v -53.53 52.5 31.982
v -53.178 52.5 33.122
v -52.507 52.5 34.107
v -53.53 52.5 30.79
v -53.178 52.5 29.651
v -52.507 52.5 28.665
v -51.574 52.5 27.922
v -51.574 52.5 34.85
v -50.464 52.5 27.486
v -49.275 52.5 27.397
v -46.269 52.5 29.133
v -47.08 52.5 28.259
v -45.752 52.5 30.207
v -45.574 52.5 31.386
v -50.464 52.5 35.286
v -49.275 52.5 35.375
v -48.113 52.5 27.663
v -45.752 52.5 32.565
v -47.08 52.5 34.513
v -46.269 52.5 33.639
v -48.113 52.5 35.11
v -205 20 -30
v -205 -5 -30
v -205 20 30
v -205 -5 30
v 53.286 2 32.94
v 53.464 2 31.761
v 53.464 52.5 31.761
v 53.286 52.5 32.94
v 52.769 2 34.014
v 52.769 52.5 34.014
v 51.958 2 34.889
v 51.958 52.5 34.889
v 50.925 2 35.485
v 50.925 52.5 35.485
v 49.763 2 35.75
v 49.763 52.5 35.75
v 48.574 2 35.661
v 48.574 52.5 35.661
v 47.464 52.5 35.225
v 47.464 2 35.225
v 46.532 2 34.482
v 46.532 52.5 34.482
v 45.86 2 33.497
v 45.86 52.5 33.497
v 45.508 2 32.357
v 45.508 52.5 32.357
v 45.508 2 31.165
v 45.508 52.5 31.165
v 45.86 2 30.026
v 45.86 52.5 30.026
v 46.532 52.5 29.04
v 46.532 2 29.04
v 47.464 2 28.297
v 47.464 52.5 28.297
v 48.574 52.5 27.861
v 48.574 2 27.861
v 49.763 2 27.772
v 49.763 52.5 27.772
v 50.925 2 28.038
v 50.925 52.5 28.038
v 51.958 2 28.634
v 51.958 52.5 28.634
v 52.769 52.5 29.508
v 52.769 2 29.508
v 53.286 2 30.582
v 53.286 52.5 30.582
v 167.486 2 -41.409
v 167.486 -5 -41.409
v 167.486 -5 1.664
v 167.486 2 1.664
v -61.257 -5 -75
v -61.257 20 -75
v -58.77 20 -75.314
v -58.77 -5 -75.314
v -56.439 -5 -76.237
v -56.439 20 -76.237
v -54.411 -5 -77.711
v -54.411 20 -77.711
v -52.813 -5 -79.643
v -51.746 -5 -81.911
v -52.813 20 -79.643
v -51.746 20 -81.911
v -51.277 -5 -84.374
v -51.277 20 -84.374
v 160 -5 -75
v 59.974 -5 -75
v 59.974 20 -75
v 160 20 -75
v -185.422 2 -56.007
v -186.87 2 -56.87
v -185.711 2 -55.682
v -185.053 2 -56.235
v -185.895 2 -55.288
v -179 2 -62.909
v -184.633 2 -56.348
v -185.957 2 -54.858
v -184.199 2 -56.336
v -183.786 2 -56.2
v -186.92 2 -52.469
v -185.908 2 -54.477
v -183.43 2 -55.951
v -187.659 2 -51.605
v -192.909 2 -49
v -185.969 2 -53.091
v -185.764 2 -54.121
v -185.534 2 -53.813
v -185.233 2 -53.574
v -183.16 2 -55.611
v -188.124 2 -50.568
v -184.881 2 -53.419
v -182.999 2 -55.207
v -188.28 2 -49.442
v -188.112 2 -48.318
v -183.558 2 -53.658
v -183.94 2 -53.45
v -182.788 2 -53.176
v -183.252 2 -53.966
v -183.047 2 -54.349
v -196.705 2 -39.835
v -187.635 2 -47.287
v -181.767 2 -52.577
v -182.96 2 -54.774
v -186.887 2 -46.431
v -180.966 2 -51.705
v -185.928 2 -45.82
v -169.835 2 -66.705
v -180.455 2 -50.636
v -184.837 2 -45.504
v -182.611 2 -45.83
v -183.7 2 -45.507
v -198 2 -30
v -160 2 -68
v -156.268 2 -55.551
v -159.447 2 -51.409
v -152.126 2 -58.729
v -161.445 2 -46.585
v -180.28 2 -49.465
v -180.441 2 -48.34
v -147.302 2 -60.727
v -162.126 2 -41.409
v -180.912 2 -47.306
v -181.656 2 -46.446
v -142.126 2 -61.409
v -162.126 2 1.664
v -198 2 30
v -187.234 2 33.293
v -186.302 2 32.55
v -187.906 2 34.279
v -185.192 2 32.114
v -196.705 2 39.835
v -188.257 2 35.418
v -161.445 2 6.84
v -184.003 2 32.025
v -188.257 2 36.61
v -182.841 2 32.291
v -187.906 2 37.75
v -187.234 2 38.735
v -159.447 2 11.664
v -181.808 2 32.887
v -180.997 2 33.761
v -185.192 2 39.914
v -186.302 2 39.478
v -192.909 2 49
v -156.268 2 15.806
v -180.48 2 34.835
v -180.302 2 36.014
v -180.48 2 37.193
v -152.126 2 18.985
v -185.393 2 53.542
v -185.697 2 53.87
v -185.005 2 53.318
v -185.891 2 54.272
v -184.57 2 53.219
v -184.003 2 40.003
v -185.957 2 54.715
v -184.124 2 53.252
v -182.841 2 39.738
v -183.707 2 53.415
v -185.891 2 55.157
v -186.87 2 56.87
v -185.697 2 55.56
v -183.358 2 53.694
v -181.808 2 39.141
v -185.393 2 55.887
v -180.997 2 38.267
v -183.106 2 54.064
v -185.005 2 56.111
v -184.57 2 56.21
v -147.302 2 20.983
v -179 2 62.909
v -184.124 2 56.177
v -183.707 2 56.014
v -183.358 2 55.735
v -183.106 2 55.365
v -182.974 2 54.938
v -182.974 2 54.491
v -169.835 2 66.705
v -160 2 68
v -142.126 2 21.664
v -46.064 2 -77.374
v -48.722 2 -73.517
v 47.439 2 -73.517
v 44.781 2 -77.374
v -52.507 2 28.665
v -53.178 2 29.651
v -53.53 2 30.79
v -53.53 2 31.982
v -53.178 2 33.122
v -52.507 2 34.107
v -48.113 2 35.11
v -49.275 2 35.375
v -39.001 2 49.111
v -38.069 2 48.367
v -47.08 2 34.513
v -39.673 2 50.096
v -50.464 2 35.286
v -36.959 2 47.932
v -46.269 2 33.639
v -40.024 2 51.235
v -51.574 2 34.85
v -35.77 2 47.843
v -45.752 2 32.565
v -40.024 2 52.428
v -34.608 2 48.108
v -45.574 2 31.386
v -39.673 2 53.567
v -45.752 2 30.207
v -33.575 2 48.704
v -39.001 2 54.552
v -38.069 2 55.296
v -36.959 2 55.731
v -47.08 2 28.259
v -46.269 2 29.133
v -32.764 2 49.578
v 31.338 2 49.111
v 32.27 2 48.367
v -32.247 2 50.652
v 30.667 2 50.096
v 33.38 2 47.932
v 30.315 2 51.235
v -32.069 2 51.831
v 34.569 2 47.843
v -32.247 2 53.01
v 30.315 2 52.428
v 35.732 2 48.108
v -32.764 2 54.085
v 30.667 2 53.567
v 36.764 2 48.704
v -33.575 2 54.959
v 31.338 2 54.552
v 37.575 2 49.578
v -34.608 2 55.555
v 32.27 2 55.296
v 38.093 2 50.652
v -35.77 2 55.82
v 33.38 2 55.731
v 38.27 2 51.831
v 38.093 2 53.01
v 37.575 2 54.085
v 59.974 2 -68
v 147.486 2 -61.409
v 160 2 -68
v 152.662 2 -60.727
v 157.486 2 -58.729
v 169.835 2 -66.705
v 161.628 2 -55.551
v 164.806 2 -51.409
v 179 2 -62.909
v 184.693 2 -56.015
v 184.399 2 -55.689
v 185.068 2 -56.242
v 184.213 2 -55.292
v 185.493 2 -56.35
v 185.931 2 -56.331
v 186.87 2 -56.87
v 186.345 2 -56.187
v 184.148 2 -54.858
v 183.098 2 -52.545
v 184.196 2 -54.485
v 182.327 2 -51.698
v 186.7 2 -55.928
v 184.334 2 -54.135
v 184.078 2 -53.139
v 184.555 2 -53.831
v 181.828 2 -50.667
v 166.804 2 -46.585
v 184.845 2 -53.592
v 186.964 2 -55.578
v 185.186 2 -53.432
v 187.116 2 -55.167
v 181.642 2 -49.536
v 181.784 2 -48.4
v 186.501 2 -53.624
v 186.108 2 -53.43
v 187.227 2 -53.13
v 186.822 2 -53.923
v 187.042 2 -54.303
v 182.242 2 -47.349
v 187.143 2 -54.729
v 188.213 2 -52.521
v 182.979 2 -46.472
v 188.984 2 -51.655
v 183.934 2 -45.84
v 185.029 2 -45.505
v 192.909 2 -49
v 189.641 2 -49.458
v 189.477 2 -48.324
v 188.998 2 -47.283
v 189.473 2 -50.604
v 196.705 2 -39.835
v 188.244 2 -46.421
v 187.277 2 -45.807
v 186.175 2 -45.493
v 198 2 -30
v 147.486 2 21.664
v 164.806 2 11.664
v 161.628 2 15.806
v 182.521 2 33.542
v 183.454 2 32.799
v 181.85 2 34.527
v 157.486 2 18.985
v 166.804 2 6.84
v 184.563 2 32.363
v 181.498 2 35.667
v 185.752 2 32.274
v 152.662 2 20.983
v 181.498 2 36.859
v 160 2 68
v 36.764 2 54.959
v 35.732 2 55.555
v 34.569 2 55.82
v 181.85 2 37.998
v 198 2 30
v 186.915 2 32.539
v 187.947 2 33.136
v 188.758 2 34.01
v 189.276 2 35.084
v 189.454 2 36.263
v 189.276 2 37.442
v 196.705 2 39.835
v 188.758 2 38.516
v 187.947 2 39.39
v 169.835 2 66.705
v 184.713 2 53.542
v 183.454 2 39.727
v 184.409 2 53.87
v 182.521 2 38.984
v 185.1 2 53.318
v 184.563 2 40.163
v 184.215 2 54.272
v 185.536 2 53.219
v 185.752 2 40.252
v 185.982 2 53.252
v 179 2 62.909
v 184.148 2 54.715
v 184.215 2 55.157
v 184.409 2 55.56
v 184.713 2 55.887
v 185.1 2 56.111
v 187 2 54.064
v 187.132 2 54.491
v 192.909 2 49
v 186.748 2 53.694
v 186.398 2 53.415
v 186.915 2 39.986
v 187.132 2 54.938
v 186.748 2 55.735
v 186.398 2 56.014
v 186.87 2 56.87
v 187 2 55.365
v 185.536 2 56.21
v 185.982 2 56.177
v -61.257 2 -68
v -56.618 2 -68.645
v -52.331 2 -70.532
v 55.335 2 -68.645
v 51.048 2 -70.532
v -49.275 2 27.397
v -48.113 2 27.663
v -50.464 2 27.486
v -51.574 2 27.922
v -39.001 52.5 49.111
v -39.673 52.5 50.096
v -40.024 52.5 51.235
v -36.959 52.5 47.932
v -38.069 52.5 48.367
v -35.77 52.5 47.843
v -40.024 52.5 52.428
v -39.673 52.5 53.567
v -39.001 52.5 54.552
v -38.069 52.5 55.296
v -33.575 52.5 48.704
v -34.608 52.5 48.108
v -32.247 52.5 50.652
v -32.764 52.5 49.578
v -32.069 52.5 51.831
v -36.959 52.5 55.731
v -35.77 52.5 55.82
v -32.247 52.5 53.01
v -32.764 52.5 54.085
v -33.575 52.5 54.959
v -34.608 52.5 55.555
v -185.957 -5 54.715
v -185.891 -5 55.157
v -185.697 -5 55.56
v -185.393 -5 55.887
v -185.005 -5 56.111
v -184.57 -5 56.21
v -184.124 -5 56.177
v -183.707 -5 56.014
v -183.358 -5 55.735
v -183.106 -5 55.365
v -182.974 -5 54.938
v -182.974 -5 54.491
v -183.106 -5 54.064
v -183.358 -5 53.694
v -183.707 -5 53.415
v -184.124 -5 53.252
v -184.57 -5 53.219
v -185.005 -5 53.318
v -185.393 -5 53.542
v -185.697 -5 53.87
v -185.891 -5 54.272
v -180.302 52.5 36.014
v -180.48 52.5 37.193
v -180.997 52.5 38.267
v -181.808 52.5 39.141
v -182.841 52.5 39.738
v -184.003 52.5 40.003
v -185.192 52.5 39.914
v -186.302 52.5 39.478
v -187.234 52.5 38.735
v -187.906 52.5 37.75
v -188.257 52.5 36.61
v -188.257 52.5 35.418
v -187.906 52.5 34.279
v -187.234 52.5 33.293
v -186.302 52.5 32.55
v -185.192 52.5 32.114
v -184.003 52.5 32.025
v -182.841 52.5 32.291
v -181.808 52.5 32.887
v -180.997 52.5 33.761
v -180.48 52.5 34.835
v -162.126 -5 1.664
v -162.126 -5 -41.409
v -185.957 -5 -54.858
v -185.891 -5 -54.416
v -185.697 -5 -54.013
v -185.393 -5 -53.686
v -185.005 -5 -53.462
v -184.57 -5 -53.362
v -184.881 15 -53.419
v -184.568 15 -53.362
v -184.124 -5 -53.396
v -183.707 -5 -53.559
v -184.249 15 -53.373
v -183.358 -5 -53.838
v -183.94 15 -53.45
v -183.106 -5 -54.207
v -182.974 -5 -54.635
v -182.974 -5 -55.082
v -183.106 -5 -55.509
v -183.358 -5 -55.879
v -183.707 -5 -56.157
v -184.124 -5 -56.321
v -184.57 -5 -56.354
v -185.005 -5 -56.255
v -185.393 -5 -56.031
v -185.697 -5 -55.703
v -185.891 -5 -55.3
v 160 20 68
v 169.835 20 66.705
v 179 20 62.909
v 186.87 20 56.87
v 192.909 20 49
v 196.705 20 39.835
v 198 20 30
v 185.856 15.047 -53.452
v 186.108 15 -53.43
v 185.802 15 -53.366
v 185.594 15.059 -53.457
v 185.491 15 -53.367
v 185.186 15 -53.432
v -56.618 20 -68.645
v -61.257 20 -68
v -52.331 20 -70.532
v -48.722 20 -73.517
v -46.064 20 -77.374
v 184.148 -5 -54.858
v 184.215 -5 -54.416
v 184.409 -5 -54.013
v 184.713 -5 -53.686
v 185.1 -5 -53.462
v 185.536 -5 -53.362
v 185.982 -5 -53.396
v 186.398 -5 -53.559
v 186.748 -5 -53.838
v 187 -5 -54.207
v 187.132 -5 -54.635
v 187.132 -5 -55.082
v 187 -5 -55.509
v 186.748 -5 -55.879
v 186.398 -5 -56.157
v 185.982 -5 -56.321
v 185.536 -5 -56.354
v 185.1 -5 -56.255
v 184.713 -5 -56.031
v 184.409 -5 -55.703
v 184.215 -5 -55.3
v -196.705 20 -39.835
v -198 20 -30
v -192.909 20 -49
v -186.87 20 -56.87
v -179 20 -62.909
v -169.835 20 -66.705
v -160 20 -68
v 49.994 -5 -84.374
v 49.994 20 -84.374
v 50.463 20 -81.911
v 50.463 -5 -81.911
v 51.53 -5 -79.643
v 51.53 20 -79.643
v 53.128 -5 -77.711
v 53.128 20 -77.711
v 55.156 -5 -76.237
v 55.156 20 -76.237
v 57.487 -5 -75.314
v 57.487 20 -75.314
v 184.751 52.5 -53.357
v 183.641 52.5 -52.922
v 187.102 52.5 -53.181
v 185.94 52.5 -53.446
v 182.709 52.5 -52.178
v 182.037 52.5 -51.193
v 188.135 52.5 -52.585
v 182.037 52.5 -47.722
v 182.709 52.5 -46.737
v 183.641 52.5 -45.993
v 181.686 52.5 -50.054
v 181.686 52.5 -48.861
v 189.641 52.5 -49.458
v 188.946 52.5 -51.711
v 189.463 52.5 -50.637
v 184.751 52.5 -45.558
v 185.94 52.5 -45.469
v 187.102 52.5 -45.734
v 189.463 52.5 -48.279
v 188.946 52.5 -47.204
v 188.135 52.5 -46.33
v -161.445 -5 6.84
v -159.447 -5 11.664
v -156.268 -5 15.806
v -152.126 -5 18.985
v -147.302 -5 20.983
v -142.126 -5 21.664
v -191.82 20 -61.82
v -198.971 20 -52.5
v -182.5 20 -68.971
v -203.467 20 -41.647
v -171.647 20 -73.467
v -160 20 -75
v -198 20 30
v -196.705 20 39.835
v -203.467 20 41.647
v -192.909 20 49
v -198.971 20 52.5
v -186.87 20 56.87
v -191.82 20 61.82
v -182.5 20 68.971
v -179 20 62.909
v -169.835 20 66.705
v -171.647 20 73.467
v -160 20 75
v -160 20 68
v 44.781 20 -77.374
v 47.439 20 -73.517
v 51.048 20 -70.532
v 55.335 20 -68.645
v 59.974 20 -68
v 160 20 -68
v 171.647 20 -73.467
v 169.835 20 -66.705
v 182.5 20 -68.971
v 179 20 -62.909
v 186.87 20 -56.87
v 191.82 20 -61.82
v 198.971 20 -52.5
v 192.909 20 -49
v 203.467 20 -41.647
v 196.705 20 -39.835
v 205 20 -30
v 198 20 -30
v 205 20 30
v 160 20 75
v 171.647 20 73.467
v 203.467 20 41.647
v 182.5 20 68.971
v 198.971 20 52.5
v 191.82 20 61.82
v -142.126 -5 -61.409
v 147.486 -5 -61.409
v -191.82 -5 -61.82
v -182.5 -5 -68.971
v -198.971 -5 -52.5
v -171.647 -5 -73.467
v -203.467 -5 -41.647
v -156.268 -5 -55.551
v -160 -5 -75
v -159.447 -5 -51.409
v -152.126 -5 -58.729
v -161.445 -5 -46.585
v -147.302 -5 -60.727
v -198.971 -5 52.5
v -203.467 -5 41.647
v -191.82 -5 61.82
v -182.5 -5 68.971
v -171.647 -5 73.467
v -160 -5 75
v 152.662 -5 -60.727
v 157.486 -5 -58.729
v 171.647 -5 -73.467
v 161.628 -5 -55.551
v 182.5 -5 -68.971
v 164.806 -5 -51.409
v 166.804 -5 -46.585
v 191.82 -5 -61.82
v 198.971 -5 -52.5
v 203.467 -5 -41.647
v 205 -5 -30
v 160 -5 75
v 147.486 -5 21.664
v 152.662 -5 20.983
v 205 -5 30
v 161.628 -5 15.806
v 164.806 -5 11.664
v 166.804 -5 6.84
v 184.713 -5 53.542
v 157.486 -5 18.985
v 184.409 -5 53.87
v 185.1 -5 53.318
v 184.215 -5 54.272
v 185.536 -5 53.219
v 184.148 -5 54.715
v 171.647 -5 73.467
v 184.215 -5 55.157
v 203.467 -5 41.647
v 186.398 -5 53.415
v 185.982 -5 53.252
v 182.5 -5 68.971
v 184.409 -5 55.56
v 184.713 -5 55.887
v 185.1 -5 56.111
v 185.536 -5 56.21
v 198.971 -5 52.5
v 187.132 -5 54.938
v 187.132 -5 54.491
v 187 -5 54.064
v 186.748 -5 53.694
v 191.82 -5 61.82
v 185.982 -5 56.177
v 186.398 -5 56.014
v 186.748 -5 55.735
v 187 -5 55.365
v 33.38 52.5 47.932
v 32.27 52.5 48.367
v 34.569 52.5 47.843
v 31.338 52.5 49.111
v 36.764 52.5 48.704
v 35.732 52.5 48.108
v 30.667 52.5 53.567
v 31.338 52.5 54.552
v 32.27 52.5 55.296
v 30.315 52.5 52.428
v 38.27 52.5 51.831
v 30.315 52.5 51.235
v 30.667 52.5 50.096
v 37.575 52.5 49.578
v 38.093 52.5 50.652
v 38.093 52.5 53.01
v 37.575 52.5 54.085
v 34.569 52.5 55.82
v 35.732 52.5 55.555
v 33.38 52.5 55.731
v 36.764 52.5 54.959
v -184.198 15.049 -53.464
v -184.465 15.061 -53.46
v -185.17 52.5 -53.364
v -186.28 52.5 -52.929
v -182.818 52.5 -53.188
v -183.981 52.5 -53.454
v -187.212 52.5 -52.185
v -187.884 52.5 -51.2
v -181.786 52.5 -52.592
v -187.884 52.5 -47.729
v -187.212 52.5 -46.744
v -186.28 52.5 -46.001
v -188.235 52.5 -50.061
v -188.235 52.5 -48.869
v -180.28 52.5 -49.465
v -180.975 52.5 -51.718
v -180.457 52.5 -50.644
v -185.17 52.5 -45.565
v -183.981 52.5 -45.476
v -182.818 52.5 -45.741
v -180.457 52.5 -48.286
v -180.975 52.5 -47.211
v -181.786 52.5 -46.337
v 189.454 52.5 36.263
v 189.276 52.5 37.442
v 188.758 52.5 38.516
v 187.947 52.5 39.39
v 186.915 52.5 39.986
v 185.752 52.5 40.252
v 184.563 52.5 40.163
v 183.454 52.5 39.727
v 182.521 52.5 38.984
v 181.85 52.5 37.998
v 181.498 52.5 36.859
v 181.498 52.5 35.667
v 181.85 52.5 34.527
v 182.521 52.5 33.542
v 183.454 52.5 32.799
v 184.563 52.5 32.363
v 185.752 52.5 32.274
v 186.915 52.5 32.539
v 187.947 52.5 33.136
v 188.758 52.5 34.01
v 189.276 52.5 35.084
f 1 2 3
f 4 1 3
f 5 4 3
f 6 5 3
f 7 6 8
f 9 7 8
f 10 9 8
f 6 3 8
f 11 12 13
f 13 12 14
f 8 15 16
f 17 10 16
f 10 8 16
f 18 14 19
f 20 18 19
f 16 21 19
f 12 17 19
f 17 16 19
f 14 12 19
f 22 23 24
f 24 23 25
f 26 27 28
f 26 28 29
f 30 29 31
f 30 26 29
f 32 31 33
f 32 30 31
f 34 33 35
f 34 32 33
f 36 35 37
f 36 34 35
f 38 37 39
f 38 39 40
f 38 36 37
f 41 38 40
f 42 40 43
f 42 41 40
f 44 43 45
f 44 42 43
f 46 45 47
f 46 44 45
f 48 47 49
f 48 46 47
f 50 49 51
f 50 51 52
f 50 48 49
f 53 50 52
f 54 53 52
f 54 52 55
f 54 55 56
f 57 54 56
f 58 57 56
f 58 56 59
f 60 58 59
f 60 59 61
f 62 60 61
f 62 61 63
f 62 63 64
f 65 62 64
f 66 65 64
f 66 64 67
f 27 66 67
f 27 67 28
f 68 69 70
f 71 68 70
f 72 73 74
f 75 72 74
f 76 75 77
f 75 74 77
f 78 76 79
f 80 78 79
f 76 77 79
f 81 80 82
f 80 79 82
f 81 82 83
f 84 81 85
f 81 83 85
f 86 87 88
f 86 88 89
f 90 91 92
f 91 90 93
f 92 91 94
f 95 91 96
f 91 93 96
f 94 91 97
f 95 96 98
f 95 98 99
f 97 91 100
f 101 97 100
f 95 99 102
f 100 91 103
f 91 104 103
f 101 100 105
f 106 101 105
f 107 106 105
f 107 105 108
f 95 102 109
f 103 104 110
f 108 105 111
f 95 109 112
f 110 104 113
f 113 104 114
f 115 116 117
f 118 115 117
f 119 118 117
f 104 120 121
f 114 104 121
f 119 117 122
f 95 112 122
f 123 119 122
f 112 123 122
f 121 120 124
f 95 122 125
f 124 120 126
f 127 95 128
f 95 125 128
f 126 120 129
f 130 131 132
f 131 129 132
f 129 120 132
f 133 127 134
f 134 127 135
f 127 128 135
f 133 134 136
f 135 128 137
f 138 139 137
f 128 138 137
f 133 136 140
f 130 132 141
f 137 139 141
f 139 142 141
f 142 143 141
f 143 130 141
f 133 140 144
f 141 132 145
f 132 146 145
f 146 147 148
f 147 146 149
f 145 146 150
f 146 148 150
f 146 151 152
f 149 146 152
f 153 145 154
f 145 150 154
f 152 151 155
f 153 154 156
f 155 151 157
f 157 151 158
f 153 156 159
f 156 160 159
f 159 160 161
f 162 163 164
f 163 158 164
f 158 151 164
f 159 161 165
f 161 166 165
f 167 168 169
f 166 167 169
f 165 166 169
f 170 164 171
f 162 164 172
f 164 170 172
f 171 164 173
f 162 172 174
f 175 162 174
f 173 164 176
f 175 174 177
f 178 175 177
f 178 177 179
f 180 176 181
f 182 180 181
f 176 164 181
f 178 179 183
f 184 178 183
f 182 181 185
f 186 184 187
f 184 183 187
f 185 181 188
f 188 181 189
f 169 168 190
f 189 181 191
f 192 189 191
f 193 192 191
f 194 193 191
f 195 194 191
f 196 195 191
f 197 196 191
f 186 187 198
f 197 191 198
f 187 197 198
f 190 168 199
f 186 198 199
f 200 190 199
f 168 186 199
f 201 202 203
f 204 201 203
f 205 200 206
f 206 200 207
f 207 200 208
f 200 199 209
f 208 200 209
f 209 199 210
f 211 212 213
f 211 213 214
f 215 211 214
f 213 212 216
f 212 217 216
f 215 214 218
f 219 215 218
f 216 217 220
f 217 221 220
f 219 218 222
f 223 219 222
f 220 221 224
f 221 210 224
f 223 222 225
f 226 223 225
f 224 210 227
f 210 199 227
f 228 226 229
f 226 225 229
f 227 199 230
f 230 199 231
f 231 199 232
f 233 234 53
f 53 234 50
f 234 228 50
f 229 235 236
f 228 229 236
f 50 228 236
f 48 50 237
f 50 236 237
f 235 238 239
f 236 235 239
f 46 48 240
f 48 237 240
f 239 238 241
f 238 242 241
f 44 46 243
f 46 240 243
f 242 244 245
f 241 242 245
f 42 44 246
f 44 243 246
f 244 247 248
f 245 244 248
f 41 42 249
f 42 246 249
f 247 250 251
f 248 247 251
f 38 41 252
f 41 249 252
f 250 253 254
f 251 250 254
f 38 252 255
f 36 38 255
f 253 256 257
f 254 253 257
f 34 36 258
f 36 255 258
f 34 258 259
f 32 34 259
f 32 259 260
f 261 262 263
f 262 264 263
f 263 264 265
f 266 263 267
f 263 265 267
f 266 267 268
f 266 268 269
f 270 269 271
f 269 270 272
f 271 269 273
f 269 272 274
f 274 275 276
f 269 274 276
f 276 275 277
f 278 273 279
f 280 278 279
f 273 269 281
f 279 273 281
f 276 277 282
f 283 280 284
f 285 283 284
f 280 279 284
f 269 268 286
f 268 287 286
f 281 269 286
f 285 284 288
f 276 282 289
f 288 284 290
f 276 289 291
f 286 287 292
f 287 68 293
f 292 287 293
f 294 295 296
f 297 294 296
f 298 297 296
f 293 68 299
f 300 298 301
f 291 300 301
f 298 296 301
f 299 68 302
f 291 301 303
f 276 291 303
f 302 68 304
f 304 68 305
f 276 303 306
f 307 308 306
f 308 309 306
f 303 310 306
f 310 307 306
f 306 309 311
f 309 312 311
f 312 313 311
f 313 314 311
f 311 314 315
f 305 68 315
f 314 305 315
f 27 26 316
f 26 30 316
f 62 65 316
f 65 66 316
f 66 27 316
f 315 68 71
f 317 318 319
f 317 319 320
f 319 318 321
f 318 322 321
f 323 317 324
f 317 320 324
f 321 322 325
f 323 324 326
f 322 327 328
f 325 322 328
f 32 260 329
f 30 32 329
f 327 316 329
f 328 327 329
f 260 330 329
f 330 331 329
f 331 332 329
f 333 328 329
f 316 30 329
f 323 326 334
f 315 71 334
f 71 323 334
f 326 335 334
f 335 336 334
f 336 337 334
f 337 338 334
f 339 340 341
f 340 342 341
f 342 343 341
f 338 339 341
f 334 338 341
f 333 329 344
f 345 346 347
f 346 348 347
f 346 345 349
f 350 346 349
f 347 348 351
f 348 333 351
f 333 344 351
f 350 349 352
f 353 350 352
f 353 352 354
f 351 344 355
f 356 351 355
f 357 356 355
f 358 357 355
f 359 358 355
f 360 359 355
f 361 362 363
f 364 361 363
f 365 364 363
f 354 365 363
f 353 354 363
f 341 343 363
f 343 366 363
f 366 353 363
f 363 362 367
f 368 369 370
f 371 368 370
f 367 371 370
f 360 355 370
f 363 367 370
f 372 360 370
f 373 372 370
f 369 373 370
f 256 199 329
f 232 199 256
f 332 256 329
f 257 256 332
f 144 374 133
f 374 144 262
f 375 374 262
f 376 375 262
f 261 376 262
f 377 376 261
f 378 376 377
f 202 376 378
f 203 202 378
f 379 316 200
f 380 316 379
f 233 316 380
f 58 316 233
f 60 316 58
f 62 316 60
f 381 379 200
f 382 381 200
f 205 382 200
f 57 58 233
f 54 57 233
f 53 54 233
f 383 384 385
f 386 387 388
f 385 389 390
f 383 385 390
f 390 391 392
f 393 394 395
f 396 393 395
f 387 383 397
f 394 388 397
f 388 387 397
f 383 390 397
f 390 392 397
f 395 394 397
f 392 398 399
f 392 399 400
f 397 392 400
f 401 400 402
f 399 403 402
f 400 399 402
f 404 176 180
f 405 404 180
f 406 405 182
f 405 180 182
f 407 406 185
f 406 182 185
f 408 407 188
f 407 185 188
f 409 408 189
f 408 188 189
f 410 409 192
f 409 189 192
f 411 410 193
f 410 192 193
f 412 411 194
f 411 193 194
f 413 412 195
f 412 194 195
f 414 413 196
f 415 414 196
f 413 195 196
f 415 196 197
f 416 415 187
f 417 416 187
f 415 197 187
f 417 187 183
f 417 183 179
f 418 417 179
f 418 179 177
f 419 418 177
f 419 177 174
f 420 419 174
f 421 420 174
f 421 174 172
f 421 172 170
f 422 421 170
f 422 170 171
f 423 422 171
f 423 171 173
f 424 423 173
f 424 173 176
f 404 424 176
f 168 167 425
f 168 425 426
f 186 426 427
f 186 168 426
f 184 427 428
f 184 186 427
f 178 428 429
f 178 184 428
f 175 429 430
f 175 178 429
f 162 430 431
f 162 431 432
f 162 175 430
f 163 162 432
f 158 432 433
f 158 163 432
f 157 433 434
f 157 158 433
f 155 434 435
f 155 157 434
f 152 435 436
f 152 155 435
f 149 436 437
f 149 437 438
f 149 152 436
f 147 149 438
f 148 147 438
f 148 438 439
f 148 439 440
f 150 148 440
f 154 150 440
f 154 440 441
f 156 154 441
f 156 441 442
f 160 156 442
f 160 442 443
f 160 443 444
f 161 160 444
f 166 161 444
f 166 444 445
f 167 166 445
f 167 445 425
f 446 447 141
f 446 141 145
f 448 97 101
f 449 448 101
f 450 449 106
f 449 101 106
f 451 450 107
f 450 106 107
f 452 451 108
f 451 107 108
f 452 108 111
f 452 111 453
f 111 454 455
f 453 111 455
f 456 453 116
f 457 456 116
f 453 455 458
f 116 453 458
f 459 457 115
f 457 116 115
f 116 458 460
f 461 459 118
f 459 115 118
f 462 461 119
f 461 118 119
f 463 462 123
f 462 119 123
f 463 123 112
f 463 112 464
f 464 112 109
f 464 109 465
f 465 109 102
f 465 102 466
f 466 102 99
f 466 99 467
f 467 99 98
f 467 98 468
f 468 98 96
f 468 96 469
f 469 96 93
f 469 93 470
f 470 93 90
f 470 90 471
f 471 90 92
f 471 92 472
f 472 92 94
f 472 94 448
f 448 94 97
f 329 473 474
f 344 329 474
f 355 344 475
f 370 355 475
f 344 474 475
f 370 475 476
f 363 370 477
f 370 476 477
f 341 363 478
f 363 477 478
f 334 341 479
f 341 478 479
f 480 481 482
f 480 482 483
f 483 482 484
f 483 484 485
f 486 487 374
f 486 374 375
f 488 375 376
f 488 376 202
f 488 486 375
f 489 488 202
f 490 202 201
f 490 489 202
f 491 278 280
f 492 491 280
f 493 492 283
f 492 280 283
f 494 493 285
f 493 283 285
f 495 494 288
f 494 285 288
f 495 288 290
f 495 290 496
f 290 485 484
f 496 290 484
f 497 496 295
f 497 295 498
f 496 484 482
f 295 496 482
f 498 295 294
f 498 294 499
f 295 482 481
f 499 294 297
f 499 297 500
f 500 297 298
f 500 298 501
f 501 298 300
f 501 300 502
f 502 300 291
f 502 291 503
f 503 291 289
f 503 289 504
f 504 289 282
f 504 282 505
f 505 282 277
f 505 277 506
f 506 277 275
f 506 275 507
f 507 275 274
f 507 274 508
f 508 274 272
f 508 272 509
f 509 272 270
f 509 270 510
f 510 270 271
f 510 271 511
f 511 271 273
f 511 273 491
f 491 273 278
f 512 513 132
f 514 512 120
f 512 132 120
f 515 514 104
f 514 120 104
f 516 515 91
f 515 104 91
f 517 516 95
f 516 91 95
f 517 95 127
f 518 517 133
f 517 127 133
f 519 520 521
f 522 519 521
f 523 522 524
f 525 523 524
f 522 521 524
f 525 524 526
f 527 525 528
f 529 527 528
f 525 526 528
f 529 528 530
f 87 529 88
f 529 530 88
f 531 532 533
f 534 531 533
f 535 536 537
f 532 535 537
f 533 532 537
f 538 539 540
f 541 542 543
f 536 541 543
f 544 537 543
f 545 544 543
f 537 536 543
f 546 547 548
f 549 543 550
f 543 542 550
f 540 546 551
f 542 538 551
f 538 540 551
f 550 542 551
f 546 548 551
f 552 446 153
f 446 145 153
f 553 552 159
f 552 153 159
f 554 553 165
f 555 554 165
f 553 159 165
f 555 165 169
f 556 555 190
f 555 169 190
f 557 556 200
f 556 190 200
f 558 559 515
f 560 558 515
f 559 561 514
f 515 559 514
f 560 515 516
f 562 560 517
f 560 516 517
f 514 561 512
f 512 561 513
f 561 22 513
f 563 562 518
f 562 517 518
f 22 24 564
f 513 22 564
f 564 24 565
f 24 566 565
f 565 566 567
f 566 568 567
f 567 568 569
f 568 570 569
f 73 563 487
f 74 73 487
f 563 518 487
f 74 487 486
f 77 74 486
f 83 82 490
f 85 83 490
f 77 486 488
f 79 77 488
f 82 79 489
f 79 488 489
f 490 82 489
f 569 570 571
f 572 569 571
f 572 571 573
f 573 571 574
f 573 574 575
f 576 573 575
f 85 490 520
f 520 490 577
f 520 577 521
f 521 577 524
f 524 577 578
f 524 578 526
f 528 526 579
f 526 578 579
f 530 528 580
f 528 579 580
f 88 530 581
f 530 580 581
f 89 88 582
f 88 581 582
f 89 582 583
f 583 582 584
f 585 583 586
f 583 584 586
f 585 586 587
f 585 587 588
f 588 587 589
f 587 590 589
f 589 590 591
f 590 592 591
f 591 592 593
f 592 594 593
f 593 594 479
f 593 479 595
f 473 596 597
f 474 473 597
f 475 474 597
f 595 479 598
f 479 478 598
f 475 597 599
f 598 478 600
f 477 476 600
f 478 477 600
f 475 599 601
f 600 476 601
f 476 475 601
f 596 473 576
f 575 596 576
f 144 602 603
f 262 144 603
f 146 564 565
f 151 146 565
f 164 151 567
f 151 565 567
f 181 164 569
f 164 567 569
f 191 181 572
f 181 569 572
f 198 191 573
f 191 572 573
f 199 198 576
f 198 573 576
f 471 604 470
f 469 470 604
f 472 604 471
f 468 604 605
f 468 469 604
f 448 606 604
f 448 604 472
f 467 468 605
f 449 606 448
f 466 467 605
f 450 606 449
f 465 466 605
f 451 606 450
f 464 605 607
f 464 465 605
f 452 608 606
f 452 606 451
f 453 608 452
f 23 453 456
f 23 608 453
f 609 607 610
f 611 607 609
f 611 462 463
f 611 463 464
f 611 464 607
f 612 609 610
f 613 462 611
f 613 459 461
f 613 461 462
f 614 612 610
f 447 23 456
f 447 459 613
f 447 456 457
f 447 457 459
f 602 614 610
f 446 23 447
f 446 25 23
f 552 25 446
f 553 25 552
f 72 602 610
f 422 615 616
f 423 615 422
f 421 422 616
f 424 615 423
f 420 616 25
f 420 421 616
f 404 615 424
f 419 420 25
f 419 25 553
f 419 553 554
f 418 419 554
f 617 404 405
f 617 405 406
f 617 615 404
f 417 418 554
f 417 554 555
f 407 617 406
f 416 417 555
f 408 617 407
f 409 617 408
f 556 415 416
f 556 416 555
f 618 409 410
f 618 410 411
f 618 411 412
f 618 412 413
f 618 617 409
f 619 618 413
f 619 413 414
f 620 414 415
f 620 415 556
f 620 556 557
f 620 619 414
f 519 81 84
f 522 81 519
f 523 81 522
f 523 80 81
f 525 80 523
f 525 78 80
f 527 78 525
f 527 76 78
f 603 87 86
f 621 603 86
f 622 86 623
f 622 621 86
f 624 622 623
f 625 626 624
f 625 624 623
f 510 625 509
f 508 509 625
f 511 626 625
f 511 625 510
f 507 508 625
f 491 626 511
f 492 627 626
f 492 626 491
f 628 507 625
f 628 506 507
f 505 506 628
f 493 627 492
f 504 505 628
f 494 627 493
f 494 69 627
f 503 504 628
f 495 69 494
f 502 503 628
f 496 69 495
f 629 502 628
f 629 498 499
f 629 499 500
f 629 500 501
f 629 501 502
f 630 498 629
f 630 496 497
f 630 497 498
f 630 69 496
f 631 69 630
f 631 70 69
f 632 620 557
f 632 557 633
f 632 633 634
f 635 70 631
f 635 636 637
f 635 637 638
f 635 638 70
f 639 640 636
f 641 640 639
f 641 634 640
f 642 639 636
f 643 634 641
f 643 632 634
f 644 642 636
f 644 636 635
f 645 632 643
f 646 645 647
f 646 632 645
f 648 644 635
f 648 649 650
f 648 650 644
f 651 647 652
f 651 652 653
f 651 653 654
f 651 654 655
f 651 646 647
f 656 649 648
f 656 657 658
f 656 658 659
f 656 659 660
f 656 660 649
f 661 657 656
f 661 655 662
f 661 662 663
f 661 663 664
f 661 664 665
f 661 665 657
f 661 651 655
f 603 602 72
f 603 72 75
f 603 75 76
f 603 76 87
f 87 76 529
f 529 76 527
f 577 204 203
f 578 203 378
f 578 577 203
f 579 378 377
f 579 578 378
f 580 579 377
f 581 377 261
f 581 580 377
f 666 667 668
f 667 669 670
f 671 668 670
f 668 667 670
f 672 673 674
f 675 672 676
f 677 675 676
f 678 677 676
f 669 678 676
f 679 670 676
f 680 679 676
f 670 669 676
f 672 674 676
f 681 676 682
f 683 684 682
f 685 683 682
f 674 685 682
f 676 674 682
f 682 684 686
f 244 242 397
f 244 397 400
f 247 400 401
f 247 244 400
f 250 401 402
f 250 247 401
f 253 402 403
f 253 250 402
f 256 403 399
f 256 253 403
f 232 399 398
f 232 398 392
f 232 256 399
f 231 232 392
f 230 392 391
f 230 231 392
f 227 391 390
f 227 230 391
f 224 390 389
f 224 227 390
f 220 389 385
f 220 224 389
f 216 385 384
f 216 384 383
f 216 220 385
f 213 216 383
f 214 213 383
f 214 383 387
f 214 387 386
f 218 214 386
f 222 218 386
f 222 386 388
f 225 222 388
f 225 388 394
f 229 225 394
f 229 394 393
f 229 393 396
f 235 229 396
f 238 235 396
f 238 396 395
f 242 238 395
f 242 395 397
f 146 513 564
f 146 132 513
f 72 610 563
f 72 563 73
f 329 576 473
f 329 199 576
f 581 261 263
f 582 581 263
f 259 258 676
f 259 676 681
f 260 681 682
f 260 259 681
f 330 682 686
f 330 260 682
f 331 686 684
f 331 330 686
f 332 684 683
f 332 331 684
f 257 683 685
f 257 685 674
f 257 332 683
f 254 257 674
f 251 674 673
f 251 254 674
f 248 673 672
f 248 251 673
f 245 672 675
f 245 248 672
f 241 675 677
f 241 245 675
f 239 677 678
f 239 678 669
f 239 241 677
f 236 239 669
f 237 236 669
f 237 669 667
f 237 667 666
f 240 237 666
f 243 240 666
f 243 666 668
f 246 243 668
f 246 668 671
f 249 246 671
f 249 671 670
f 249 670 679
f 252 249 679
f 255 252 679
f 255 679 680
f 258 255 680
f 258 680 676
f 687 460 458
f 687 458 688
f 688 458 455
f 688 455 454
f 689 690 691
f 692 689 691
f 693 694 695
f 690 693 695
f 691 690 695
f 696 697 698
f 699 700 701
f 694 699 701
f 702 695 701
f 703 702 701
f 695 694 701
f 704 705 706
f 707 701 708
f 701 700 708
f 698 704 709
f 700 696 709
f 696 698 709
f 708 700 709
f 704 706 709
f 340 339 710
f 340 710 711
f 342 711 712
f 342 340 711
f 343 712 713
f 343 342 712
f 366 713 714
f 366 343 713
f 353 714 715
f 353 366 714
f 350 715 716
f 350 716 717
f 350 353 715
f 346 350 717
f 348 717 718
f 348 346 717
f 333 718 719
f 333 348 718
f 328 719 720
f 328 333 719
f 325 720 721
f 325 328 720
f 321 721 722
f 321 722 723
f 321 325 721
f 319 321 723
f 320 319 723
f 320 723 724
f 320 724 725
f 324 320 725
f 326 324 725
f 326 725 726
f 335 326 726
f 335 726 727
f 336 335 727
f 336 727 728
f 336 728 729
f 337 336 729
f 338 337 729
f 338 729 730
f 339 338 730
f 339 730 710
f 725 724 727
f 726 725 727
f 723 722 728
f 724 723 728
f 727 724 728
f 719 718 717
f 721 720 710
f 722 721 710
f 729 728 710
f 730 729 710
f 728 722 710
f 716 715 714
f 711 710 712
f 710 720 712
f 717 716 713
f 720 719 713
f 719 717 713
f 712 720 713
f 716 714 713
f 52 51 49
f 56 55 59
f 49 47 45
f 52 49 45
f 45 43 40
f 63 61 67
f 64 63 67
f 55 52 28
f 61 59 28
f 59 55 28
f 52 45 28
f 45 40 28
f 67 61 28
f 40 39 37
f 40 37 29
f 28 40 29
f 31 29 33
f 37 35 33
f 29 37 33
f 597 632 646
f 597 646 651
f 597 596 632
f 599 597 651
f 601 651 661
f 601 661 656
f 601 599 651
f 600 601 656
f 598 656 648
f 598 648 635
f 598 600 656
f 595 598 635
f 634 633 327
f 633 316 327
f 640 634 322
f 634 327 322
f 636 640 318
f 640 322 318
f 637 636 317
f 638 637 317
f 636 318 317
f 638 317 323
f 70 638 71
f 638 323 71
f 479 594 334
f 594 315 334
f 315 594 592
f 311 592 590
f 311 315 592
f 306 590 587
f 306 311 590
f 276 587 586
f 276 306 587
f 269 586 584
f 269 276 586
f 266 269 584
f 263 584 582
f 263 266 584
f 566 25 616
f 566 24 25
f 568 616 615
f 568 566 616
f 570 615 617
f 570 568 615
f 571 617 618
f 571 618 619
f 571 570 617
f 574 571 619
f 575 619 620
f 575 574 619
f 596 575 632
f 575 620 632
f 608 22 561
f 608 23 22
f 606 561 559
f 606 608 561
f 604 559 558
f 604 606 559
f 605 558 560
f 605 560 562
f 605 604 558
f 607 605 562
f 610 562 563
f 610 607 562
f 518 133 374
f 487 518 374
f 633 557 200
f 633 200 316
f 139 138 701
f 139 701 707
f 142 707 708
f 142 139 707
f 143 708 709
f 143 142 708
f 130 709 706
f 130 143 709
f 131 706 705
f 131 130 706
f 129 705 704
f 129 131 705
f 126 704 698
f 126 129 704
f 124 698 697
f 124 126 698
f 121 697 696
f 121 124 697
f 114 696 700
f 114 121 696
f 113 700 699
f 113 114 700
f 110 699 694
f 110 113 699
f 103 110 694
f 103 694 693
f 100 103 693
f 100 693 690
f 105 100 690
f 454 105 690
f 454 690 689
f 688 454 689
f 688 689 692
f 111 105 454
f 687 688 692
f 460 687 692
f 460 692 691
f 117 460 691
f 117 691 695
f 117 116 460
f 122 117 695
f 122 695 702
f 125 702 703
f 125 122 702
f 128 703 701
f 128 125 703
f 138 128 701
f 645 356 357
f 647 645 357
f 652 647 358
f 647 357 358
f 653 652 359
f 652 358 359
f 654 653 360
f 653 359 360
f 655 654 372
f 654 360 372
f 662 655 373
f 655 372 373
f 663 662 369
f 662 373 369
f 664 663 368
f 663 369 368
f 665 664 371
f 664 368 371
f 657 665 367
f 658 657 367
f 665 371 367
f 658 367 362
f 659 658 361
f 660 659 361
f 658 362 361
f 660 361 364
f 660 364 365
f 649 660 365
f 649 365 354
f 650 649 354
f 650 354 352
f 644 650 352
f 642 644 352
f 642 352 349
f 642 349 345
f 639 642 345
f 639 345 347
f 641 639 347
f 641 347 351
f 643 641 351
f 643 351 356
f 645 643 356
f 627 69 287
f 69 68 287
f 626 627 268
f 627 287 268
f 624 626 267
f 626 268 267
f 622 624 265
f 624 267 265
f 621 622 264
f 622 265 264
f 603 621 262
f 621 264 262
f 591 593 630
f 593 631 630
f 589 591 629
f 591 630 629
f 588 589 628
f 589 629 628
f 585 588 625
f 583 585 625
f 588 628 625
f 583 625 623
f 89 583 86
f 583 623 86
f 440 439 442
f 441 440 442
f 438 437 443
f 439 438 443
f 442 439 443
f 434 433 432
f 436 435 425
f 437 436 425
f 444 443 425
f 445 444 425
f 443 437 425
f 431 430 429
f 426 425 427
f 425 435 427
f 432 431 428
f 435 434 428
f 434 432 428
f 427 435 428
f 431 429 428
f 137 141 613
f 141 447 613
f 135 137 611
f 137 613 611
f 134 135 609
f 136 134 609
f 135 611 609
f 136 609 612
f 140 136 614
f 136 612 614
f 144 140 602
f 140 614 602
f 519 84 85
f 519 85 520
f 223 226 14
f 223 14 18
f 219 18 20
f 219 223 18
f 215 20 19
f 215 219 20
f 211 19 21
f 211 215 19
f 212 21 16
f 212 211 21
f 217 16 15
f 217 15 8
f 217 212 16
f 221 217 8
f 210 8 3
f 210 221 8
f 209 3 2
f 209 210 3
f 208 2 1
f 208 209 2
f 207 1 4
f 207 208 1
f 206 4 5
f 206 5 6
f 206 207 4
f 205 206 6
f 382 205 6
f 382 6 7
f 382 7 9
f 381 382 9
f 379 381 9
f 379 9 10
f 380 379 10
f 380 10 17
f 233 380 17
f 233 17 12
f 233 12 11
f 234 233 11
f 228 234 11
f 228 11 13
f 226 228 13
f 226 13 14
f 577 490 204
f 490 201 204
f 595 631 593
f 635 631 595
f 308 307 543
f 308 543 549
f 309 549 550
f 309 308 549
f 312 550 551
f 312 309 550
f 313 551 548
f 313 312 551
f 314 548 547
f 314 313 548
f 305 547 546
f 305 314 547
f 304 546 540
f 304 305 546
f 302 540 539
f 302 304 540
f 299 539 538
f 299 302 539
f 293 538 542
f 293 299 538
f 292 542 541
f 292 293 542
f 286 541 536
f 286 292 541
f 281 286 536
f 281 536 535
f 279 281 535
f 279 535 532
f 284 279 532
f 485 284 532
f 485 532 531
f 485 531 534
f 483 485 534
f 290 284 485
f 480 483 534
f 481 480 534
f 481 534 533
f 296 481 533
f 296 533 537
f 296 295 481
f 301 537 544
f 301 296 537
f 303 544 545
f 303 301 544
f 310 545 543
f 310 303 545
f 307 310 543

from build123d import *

# Parameters (mm, degrees)
F0_W           = 410
F0_H           = 150
F1_DEPTH       = 5
F1_DEPTH_BACK  = 20
F2_R           = 45
F3_R           = 45
F4_R           = 45
F5_W           = 101.2708619237
F5_H           = 20.8901241422
F6_DEPTH       = 5
F6_DEPTH_BACK  = 20
F7_T1_DEPTH    = 25
F8_T1_DEPTH    = 25
F10_T          = -7
F12_R          = 4
F13_DEPTH      = 55.5
F14_W          = 329.6116441488
F14_H          = 83.0728560686
F15_DEPTH      = 25
F15_DEPTH_BACK = 25
F16_R          = 20
F20_D          = 3
F20_DEPTH      = 20
F20_TIP        = 0.9012909285


# Not quite as in the source:
# - a fillet or chamfer that OpenCascade refuses, or shapes differently, is made with other operations: its cross-section is extruded or revolved along the edge and cut away or added


with BuildPart() as f1:
    # F0 (on Front) → F1 (new body, two sides)
    with BuildSketch(Plane.XZ) as f1_sk:
        Rectangle(F0_W, F0_H)
    extrude(amount=F1_DEPTH)
    extrude(f1_sk.sketch, amount=-F1_DEPTH_BACK)

    # F2
    f2_edges = [f1.edges().sort_by_distance(p)[0] for p in [
        (-205, 7.5, 75),
        (-205, 7.5, -75),
    ]]
    fillet(f2_edges, radius=F2_R)

    # F3
    f3_edges = [f1.edges().sort_by_distance(p)[0] for p in [
        (205, 7.5, 75),
    ]]
    fillet(f3_edges, radius=F3_R)

    # F4
    f4_edges = [f1.edges().sort_by_distance(p)[0] for p in [
        (205, 7.5, -75),
    ]]
    fillet(f4_edges, radius=F4_R)

    # F5 (on Front) → F6 (join, two sides)
    with BuildSketch(Plane.XZ) as f6_sk:
        with Locations((-0.6414987147, -73.9290080965)):
            Rectangle(F5_W, F5_H)
    extrude(amount=F6_DEPTH)
    extrude(f6_sk.sketch, amount=-F6_DEPTH_BACK)

    # F7: fillet of radius 10 on 1 edges, made by hand

    # F7_s2 → F7_t1 (join)
    with BuildSketch(Plane.XZ.offset(-20)):
        with BuildLine():
            ThreePointArc((-61.2573210439, -75), (-54.4111286103, -77.7109912085), (-51.2769296765, -84.3740701675))
            Line((-51.2769296765, -84.3740701675), (-51.2769296765, -75))
            Line((-51.2769296765, -75), (-61.2573210439, -75))
        make_face()
    extrude(amount=F7_T1_DEPTH)

    # F8: fillet of radius 10 on 1 edges, made by hand

    # F8_s2 → F8_t1 (join)
    with BuildSketch(Plane.XZ.offset(-20)):
        with BuildLine():
            ThreePointArc((49.9939322472, -84.3740701675), (53.1281311809, -77.7109912085), (59.9743236145, -75))
            Line((59.9743236145, -75), (49.9939322472, -75))
            Line((49.9939322472, -75), (49.9939322472, -84.3740701675))
        make_face()
    extrude(amount=F8_T1_DEPTH)

    # F10
    f10_openings = [f1.faces().sort_by_distance(p)[0] for p in [
        (-0.010473, 20, -1.299239),
    ]]
    offset(amount=F10_T, openings=f10_openings)

    # F12 (on offset) → F13 (join)
    with BuildSketch(Plane.XZ.offset(3)):
        with Locations((-184.3019276857, 36.01404652)):
            Circle(F12_R)
        with Locations((-184.2796504498, -49.4647398591)):
            Circle(F12_R)
        with Locations((-36.0691249371, 51.8314018846)):
            Circle(F12_R)
        with Locations((-49.5743155479, 31.3860401511)):
            Circle(F12_R)
        with Locations((34.2704169452, 51.8314018846)):
            Circle(F12_R)
        with Locations((49.4637563825, 31.7611843348)):
            Circle(F12_R)
        with Locations((185.4535341263, 36.2629145384)):
            Circle(F12_R)
        with Locations((185.6411099434, -49.4575425982)):
            Circle(F12_R)
    extrude(amount=-F13_DEPTH)

    # F14 (on face) → F15 (cut, two sides)
    with BuildSketch(Plane.XZ) as f15_sk:
        with Locations((2.6797705796, -19.8723953217)):
            Rectangle(F14_W, F14_H)
    extrude(amount=F15_DEPTH, mode=Mode.SUBTRACT)
    extrude(f15_sk.sketch, amount=-F15_DEPTH_BACK, mode=Mode.SUBTRACT)

    # F16
    f16_edges = [f1.edges().sort_by_distance(p)[0] for p in [
        (-162.126051, -1.5, 21.664033),
        (167.485593, -1.5, 21.664033),
        (167.485593, -1.5, -61.408823),
        (-162.126051, -1.5, -61.408823),
    ]]
    fillet(f16_edges, radius=F16_R)

    # F20
    with Locations(Plane.XZ.offset(5)):
        with Locations((-184.4574809074, 54.7145232558), (-184.4574809074, -54.8582747579), (185.6484860182, -54.8582747579), (185.6484860182, 54.7145232558)):
            Hole(F20_D / 2, depth=F20_DEPTH)
            with Locations((0, 0, -(F20_DEPTH + F20_TIP / 2))):  # 118° drill point
                Cone(0, F20_D / 2, F20_TIP, mode=Mode.SUBTRACT)


solid = f1.part
